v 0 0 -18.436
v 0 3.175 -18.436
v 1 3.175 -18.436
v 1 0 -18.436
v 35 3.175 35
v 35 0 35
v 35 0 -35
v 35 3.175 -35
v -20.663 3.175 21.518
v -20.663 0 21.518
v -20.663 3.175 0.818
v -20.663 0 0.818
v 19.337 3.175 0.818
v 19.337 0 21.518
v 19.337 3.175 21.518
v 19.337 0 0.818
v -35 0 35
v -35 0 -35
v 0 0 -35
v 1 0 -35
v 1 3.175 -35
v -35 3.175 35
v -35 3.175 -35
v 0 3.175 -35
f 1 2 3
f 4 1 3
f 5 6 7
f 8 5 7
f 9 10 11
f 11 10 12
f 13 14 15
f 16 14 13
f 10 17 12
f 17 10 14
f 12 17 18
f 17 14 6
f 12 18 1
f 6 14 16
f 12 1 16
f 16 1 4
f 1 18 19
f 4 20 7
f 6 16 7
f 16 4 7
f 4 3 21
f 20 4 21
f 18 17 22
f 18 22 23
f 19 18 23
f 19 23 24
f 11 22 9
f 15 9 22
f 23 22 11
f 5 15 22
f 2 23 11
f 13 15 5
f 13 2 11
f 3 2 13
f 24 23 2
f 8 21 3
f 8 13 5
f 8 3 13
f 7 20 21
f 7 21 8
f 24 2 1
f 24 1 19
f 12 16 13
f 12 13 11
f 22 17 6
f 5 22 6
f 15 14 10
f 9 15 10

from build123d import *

# Parameters (mm, degrees)
SKETCH1_W           = 70
SKETCH1_H           = 70
BOSS_EXTRUDE1_DEPTH = 3.175
SKETCH2_W           = 1
SKETCH2_H           = 16.56370183
CUT_EXTRUDE1_DEPTH  = 3.175
SKETCH3_W           = 40
SKETCH3_H           = 20.7
CUT_EXTRUDE2_DEPTH  = 3.175


with BuildPart() as part:
    # Sketch1 → Boss-Extrude1 (new body)
    with BuildSketch(Plane(origin=(0, 0, 0), x_dir=(1, 0, 0), z_dir=(0, 1, 0))):
        Rectangle(SKETCH1_W, SKETCH1_H)
    extrude(amount=BOSS_EXTRUDE1_DEPTH)

    # Sketch2 → Cut-Extrude1 (cut)
    with BuildSketch(Plane(origin=(0, 3.175, 0), x_dir=(1, 0, 0), z_dir=(0, 1, 0))):
        with Locations((0.5, 26.718149085)):
            Rectangle(SKETCH2_W, SKETCH2_H)
    extrude(amount=-CUT_EXTRUDE1_DEPTH, mode=Mode.SUBTRACT)

    # Sketch3 → Cut-Extrude2 (cut)
    with BuildSketch(Plane(origin=(0, 0, 0), x_dir=(-1, 0, 0), z_dir=(0, -1, 0))):
        with Locations((0.662640496, -11.168119056)):
            Rectangle(SKETCH3_W, SKETCH3_H)
    extrude(amount=-CUT_EXTRUDE2_DEPTH, mode=Mode.SUBTRACT)


solid = part.part
